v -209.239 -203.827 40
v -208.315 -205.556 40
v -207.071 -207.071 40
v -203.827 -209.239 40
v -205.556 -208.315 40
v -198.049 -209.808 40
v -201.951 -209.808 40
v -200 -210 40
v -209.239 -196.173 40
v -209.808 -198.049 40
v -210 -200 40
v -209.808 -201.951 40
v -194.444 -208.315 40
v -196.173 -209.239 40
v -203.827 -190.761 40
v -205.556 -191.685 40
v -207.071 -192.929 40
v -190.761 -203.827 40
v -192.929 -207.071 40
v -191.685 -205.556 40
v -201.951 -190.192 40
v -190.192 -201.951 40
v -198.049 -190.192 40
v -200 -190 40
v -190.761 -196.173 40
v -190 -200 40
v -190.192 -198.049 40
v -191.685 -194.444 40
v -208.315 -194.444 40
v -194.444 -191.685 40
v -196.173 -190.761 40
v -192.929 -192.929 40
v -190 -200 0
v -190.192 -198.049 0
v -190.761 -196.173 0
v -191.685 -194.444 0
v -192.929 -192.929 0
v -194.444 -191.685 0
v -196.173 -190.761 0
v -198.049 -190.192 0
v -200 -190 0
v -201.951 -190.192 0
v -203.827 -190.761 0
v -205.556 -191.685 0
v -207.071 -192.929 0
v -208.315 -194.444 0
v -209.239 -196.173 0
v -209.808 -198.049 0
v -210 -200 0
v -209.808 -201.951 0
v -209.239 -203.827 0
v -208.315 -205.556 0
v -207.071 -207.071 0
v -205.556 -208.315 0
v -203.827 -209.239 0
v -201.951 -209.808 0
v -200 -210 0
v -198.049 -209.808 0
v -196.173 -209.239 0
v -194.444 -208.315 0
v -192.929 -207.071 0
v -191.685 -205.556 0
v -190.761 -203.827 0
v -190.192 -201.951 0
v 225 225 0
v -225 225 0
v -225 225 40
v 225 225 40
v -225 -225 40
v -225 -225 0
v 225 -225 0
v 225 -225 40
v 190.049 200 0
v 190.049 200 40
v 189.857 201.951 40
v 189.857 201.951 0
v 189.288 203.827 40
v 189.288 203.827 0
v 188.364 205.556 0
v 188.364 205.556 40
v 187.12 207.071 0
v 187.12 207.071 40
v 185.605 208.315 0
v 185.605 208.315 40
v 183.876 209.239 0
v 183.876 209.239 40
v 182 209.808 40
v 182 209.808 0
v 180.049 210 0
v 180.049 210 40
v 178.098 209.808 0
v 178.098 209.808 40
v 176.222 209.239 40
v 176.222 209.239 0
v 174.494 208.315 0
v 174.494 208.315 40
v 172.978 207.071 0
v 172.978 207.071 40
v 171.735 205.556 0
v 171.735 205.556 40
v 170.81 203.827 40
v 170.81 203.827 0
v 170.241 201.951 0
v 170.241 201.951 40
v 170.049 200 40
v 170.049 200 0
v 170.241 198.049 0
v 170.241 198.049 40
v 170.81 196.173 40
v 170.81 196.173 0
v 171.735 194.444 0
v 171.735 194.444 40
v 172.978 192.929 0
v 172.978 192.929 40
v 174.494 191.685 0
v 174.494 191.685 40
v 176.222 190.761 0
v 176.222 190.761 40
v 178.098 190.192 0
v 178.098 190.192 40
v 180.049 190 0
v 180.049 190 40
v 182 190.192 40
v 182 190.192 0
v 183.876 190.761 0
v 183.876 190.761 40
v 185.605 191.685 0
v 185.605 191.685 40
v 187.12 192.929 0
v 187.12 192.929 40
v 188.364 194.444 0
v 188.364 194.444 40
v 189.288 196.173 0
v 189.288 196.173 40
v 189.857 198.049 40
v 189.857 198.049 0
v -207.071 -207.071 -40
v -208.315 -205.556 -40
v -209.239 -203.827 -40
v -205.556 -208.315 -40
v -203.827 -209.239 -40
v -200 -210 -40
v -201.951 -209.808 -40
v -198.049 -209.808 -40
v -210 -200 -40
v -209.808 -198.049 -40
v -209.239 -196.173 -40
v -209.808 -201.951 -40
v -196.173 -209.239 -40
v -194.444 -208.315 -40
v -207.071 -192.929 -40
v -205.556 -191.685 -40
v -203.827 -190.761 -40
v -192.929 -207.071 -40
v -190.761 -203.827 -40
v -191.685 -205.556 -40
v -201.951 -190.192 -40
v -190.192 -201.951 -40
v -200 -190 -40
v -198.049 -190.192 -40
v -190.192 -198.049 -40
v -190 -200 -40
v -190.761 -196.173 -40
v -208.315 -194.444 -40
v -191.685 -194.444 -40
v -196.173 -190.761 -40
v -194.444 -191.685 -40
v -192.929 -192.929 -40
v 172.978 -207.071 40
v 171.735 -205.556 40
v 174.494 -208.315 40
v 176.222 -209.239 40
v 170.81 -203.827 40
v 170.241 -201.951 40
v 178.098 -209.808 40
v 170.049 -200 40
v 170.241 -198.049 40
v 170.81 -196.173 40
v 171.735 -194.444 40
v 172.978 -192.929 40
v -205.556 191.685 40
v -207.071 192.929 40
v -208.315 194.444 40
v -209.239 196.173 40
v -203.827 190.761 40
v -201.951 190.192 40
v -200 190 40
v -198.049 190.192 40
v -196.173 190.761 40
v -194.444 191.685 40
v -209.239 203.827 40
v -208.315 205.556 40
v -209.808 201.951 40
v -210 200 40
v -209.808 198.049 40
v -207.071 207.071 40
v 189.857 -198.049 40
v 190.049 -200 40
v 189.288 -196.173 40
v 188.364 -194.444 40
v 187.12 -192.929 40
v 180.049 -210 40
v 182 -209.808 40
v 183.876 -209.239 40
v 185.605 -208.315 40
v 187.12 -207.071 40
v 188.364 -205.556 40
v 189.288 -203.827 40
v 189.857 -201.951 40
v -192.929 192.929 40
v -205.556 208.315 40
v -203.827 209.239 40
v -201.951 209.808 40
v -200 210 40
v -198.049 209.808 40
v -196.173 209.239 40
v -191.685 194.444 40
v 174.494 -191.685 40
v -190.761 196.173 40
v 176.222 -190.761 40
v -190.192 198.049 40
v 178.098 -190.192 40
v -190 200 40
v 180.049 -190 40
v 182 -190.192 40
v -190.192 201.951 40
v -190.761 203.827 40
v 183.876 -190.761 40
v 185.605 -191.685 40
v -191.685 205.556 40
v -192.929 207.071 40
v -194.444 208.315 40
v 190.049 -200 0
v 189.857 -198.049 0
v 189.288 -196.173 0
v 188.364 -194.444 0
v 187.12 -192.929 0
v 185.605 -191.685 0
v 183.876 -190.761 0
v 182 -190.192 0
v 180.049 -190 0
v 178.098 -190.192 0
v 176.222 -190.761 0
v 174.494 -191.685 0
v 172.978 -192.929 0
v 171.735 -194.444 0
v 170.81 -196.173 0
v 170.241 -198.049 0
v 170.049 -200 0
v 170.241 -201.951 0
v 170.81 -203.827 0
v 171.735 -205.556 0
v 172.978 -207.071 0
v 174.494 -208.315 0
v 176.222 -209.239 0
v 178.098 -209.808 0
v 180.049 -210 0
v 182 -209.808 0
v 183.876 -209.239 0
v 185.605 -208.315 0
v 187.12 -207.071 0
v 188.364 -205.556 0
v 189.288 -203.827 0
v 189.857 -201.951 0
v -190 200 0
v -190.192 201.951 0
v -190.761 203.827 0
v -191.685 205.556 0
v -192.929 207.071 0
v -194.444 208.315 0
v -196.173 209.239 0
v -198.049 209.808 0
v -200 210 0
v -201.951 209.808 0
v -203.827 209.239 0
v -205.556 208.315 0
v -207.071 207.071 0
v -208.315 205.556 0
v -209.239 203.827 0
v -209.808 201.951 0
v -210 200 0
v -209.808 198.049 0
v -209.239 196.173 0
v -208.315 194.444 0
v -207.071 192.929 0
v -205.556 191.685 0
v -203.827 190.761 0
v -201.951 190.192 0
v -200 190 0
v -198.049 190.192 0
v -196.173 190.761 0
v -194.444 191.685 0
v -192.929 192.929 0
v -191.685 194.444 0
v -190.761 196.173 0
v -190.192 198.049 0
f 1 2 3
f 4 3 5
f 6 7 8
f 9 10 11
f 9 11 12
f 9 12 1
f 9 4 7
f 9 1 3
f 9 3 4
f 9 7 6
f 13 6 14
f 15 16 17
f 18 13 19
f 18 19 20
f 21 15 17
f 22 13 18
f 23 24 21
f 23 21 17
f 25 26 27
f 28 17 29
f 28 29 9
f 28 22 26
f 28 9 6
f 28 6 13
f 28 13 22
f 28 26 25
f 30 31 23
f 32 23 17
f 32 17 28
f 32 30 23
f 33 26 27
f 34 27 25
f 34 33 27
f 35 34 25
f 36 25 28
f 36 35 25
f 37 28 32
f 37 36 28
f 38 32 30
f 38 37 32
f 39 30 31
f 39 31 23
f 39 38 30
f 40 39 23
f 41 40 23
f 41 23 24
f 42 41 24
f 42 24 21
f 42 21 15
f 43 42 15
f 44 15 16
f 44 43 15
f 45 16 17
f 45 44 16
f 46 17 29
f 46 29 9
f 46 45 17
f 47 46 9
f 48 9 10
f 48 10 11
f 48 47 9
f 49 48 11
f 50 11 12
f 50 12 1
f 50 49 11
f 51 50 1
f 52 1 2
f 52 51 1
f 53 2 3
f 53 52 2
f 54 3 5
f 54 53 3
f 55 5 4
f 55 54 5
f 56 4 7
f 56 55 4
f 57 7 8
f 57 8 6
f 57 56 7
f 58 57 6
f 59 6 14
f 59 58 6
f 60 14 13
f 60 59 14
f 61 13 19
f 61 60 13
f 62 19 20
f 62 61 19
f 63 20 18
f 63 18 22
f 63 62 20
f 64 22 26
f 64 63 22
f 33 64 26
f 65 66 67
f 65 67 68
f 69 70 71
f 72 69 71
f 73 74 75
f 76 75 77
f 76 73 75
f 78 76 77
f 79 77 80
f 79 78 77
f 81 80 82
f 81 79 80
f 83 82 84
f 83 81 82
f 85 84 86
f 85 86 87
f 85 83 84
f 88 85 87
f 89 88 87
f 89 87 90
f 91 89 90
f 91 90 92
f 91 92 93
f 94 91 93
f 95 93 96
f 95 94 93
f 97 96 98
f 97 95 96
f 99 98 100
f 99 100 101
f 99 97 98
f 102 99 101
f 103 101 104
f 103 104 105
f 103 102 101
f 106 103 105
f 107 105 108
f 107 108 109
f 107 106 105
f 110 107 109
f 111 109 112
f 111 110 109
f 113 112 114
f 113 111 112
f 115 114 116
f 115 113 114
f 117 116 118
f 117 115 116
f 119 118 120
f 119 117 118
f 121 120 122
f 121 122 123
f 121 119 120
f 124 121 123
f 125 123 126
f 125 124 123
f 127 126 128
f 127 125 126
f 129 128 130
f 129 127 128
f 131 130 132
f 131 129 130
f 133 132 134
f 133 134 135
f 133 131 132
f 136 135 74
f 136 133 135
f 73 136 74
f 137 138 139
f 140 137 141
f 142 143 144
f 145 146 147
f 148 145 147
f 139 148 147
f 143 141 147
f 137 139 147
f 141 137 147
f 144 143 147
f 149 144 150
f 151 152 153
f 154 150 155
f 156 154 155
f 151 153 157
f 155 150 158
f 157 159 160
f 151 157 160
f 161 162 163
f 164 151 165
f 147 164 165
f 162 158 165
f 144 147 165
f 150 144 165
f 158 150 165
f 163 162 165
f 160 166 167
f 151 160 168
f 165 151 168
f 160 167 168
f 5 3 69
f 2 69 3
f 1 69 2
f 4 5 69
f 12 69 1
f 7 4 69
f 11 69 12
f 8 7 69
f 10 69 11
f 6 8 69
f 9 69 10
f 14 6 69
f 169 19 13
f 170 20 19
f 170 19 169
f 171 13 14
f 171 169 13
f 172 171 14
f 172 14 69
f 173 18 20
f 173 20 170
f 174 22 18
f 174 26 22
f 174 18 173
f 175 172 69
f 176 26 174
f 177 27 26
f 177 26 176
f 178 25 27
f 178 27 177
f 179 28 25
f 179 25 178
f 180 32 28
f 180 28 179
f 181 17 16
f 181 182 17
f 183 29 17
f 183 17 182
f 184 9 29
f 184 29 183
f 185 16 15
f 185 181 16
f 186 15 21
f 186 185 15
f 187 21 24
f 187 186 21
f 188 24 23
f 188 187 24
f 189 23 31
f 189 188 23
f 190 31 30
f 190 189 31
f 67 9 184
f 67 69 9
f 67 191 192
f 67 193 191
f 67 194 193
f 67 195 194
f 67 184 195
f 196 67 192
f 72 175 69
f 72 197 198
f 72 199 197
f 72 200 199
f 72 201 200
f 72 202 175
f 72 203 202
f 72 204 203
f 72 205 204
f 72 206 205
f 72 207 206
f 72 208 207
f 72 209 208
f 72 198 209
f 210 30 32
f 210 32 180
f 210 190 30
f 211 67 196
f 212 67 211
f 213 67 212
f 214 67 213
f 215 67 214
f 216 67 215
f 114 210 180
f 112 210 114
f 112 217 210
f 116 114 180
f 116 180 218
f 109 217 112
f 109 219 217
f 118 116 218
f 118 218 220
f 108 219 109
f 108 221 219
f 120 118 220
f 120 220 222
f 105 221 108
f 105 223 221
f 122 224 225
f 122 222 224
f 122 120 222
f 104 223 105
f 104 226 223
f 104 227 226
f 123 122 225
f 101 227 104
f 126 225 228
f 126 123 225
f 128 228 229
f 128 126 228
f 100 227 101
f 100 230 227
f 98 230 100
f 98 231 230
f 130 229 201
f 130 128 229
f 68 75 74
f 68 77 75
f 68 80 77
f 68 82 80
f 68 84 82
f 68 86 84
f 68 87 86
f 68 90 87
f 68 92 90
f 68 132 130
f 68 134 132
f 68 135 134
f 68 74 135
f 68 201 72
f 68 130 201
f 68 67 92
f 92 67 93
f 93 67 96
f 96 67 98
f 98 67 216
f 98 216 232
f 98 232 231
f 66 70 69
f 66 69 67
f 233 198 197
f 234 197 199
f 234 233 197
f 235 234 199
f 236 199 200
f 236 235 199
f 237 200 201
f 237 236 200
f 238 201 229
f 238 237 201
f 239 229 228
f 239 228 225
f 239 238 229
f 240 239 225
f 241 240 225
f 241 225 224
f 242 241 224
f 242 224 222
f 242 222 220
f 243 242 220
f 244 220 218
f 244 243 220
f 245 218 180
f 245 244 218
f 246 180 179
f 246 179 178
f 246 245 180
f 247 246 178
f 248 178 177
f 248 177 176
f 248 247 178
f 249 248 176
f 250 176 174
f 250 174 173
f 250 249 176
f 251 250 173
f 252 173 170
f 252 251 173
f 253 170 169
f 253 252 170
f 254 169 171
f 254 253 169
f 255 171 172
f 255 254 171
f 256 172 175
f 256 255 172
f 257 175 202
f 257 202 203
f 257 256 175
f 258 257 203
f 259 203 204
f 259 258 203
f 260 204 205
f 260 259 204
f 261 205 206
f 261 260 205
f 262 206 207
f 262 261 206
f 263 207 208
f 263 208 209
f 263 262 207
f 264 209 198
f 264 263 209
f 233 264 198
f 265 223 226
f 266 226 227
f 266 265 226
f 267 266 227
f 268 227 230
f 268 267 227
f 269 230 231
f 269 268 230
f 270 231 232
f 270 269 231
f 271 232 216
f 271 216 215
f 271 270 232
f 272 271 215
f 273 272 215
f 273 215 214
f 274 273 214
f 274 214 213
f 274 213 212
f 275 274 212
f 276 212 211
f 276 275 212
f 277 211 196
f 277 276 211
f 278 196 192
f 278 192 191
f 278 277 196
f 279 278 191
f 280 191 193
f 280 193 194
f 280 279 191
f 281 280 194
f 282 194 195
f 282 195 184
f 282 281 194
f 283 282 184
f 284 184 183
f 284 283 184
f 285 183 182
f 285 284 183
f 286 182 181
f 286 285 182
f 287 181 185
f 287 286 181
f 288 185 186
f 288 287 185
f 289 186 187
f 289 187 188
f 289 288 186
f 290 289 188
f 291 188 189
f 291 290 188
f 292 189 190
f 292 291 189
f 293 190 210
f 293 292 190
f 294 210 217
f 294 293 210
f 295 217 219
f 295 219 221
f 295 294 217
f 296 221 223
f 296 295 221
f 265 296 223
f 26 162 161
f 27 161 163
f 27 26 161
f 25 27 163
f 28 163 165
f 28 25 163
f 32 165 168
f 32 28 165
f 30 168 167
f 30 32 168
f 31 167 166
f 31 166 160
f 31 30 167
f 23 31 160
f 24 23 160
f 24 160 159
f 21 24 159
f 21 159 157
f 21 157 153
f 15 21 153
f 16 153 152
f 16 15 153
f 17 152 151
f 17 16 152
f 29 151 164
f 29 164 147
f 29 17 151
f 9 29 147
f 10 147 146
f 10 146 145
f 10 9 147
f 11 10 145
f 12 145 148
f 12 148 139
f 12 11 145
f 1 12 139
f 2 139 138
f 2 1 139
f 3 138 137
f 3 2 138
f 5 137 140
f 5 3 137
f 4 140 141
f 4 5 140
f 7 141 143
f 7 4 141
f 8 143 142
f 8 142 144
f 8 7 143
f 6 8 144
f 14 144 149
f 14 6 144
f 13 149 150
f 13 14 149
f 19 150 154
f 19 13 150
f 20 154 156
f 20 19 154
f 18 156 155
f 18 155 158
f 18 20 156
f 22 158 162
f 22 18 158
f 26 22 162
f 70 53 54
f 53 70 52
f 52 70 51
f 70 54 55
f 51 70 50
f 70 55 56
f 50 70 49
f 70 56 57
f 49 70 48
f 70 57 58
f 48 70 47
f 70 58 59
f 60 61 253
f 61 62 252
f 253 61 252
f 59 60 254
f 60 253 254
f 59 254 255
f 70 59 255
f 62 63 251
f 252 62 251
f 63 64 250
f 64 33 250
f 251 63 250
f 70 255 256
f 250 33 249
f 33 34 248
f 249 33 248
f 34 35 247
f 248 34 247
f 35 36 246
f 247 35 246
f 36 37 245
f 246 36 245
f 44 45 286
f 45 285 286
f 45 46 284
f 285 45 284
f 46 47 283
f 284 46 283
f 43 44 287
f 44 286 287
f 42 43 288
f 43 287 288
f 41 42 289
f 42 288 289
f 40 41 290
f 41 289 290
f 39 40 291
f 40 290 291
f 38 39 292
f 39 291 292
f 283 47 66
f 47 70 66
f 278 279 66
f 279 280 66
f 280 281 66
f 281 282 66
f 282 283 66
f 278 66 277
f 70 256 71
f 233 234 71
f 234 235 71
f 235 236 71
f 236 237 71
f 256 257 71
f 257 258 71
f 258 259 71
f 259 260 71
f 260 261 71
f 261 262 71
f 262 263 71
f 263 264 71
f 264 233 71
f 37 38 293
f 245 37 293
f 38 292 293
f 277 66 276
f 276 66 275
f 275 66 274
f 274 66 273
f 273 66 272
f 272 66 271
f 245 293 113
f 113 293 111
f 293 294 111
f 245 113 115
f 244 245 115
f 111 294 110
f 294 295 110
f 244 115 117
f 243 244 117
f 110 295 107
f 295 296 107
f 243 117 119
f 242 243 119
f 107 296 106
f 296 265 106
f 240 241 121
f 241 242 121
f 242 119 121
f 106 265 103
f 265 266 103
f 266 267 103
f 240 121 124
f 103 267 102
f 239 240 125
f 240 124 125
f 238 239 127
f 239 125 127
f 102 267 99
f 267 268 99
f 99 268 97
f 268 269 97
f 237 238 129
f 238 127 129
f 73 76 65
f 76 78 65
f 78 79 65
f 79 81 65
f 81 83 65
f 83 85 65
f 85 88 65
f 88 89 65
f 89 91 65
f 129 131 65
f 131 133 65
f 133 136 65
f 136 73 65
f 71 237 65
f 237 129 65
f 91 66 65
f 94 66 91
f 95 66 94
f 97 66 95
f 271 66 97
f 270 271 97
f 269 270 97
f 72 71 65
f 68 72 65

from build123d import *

# Parameters (mm, degrees)
F0_W     = 450
F0_H     = 450
F0_R     = 10
F1_DEPTH = 40
F2_R     = 10
F3_DEPTH = 80


# Not quite as in the source:
# - the program builds the solid bodies; features that only make, move or delete a surface that nothing else refers to are left out


with BuildPart() as f1:
    # F0 (on Top) → F1 (new body)
    with BuildSketch(Plane.XY):
        Rectangle(F0_W, F0_H)
        with Locations((-200, -200)):
            Circle(F0_R, mode=Mode.SUBTRACT)
        with Locations((180.0492778565, -200)):
            Circle(F0_R, mode=Mode.SUBTRACT)
        with Locations((-200, 200)):
            Circle(F0_R, mode=Mode.SUBTRACT)
        with Locations((180.0492778565, 200)):
            Circle(F0_R, mode=Mode.SUBTRACT)
    extrude(amount=F1_DEPTH)


with BuildPart() as f3:
    # F2 (on face) → F3 (new body)
    with BuildSketch(Plane.XY.offset(40)):
        with Locations((-200, -200)):
            Circle(F2_R)
    extrude(amount=-F3_DEPTH)


solid = Compound([f1.part, f3.part])
